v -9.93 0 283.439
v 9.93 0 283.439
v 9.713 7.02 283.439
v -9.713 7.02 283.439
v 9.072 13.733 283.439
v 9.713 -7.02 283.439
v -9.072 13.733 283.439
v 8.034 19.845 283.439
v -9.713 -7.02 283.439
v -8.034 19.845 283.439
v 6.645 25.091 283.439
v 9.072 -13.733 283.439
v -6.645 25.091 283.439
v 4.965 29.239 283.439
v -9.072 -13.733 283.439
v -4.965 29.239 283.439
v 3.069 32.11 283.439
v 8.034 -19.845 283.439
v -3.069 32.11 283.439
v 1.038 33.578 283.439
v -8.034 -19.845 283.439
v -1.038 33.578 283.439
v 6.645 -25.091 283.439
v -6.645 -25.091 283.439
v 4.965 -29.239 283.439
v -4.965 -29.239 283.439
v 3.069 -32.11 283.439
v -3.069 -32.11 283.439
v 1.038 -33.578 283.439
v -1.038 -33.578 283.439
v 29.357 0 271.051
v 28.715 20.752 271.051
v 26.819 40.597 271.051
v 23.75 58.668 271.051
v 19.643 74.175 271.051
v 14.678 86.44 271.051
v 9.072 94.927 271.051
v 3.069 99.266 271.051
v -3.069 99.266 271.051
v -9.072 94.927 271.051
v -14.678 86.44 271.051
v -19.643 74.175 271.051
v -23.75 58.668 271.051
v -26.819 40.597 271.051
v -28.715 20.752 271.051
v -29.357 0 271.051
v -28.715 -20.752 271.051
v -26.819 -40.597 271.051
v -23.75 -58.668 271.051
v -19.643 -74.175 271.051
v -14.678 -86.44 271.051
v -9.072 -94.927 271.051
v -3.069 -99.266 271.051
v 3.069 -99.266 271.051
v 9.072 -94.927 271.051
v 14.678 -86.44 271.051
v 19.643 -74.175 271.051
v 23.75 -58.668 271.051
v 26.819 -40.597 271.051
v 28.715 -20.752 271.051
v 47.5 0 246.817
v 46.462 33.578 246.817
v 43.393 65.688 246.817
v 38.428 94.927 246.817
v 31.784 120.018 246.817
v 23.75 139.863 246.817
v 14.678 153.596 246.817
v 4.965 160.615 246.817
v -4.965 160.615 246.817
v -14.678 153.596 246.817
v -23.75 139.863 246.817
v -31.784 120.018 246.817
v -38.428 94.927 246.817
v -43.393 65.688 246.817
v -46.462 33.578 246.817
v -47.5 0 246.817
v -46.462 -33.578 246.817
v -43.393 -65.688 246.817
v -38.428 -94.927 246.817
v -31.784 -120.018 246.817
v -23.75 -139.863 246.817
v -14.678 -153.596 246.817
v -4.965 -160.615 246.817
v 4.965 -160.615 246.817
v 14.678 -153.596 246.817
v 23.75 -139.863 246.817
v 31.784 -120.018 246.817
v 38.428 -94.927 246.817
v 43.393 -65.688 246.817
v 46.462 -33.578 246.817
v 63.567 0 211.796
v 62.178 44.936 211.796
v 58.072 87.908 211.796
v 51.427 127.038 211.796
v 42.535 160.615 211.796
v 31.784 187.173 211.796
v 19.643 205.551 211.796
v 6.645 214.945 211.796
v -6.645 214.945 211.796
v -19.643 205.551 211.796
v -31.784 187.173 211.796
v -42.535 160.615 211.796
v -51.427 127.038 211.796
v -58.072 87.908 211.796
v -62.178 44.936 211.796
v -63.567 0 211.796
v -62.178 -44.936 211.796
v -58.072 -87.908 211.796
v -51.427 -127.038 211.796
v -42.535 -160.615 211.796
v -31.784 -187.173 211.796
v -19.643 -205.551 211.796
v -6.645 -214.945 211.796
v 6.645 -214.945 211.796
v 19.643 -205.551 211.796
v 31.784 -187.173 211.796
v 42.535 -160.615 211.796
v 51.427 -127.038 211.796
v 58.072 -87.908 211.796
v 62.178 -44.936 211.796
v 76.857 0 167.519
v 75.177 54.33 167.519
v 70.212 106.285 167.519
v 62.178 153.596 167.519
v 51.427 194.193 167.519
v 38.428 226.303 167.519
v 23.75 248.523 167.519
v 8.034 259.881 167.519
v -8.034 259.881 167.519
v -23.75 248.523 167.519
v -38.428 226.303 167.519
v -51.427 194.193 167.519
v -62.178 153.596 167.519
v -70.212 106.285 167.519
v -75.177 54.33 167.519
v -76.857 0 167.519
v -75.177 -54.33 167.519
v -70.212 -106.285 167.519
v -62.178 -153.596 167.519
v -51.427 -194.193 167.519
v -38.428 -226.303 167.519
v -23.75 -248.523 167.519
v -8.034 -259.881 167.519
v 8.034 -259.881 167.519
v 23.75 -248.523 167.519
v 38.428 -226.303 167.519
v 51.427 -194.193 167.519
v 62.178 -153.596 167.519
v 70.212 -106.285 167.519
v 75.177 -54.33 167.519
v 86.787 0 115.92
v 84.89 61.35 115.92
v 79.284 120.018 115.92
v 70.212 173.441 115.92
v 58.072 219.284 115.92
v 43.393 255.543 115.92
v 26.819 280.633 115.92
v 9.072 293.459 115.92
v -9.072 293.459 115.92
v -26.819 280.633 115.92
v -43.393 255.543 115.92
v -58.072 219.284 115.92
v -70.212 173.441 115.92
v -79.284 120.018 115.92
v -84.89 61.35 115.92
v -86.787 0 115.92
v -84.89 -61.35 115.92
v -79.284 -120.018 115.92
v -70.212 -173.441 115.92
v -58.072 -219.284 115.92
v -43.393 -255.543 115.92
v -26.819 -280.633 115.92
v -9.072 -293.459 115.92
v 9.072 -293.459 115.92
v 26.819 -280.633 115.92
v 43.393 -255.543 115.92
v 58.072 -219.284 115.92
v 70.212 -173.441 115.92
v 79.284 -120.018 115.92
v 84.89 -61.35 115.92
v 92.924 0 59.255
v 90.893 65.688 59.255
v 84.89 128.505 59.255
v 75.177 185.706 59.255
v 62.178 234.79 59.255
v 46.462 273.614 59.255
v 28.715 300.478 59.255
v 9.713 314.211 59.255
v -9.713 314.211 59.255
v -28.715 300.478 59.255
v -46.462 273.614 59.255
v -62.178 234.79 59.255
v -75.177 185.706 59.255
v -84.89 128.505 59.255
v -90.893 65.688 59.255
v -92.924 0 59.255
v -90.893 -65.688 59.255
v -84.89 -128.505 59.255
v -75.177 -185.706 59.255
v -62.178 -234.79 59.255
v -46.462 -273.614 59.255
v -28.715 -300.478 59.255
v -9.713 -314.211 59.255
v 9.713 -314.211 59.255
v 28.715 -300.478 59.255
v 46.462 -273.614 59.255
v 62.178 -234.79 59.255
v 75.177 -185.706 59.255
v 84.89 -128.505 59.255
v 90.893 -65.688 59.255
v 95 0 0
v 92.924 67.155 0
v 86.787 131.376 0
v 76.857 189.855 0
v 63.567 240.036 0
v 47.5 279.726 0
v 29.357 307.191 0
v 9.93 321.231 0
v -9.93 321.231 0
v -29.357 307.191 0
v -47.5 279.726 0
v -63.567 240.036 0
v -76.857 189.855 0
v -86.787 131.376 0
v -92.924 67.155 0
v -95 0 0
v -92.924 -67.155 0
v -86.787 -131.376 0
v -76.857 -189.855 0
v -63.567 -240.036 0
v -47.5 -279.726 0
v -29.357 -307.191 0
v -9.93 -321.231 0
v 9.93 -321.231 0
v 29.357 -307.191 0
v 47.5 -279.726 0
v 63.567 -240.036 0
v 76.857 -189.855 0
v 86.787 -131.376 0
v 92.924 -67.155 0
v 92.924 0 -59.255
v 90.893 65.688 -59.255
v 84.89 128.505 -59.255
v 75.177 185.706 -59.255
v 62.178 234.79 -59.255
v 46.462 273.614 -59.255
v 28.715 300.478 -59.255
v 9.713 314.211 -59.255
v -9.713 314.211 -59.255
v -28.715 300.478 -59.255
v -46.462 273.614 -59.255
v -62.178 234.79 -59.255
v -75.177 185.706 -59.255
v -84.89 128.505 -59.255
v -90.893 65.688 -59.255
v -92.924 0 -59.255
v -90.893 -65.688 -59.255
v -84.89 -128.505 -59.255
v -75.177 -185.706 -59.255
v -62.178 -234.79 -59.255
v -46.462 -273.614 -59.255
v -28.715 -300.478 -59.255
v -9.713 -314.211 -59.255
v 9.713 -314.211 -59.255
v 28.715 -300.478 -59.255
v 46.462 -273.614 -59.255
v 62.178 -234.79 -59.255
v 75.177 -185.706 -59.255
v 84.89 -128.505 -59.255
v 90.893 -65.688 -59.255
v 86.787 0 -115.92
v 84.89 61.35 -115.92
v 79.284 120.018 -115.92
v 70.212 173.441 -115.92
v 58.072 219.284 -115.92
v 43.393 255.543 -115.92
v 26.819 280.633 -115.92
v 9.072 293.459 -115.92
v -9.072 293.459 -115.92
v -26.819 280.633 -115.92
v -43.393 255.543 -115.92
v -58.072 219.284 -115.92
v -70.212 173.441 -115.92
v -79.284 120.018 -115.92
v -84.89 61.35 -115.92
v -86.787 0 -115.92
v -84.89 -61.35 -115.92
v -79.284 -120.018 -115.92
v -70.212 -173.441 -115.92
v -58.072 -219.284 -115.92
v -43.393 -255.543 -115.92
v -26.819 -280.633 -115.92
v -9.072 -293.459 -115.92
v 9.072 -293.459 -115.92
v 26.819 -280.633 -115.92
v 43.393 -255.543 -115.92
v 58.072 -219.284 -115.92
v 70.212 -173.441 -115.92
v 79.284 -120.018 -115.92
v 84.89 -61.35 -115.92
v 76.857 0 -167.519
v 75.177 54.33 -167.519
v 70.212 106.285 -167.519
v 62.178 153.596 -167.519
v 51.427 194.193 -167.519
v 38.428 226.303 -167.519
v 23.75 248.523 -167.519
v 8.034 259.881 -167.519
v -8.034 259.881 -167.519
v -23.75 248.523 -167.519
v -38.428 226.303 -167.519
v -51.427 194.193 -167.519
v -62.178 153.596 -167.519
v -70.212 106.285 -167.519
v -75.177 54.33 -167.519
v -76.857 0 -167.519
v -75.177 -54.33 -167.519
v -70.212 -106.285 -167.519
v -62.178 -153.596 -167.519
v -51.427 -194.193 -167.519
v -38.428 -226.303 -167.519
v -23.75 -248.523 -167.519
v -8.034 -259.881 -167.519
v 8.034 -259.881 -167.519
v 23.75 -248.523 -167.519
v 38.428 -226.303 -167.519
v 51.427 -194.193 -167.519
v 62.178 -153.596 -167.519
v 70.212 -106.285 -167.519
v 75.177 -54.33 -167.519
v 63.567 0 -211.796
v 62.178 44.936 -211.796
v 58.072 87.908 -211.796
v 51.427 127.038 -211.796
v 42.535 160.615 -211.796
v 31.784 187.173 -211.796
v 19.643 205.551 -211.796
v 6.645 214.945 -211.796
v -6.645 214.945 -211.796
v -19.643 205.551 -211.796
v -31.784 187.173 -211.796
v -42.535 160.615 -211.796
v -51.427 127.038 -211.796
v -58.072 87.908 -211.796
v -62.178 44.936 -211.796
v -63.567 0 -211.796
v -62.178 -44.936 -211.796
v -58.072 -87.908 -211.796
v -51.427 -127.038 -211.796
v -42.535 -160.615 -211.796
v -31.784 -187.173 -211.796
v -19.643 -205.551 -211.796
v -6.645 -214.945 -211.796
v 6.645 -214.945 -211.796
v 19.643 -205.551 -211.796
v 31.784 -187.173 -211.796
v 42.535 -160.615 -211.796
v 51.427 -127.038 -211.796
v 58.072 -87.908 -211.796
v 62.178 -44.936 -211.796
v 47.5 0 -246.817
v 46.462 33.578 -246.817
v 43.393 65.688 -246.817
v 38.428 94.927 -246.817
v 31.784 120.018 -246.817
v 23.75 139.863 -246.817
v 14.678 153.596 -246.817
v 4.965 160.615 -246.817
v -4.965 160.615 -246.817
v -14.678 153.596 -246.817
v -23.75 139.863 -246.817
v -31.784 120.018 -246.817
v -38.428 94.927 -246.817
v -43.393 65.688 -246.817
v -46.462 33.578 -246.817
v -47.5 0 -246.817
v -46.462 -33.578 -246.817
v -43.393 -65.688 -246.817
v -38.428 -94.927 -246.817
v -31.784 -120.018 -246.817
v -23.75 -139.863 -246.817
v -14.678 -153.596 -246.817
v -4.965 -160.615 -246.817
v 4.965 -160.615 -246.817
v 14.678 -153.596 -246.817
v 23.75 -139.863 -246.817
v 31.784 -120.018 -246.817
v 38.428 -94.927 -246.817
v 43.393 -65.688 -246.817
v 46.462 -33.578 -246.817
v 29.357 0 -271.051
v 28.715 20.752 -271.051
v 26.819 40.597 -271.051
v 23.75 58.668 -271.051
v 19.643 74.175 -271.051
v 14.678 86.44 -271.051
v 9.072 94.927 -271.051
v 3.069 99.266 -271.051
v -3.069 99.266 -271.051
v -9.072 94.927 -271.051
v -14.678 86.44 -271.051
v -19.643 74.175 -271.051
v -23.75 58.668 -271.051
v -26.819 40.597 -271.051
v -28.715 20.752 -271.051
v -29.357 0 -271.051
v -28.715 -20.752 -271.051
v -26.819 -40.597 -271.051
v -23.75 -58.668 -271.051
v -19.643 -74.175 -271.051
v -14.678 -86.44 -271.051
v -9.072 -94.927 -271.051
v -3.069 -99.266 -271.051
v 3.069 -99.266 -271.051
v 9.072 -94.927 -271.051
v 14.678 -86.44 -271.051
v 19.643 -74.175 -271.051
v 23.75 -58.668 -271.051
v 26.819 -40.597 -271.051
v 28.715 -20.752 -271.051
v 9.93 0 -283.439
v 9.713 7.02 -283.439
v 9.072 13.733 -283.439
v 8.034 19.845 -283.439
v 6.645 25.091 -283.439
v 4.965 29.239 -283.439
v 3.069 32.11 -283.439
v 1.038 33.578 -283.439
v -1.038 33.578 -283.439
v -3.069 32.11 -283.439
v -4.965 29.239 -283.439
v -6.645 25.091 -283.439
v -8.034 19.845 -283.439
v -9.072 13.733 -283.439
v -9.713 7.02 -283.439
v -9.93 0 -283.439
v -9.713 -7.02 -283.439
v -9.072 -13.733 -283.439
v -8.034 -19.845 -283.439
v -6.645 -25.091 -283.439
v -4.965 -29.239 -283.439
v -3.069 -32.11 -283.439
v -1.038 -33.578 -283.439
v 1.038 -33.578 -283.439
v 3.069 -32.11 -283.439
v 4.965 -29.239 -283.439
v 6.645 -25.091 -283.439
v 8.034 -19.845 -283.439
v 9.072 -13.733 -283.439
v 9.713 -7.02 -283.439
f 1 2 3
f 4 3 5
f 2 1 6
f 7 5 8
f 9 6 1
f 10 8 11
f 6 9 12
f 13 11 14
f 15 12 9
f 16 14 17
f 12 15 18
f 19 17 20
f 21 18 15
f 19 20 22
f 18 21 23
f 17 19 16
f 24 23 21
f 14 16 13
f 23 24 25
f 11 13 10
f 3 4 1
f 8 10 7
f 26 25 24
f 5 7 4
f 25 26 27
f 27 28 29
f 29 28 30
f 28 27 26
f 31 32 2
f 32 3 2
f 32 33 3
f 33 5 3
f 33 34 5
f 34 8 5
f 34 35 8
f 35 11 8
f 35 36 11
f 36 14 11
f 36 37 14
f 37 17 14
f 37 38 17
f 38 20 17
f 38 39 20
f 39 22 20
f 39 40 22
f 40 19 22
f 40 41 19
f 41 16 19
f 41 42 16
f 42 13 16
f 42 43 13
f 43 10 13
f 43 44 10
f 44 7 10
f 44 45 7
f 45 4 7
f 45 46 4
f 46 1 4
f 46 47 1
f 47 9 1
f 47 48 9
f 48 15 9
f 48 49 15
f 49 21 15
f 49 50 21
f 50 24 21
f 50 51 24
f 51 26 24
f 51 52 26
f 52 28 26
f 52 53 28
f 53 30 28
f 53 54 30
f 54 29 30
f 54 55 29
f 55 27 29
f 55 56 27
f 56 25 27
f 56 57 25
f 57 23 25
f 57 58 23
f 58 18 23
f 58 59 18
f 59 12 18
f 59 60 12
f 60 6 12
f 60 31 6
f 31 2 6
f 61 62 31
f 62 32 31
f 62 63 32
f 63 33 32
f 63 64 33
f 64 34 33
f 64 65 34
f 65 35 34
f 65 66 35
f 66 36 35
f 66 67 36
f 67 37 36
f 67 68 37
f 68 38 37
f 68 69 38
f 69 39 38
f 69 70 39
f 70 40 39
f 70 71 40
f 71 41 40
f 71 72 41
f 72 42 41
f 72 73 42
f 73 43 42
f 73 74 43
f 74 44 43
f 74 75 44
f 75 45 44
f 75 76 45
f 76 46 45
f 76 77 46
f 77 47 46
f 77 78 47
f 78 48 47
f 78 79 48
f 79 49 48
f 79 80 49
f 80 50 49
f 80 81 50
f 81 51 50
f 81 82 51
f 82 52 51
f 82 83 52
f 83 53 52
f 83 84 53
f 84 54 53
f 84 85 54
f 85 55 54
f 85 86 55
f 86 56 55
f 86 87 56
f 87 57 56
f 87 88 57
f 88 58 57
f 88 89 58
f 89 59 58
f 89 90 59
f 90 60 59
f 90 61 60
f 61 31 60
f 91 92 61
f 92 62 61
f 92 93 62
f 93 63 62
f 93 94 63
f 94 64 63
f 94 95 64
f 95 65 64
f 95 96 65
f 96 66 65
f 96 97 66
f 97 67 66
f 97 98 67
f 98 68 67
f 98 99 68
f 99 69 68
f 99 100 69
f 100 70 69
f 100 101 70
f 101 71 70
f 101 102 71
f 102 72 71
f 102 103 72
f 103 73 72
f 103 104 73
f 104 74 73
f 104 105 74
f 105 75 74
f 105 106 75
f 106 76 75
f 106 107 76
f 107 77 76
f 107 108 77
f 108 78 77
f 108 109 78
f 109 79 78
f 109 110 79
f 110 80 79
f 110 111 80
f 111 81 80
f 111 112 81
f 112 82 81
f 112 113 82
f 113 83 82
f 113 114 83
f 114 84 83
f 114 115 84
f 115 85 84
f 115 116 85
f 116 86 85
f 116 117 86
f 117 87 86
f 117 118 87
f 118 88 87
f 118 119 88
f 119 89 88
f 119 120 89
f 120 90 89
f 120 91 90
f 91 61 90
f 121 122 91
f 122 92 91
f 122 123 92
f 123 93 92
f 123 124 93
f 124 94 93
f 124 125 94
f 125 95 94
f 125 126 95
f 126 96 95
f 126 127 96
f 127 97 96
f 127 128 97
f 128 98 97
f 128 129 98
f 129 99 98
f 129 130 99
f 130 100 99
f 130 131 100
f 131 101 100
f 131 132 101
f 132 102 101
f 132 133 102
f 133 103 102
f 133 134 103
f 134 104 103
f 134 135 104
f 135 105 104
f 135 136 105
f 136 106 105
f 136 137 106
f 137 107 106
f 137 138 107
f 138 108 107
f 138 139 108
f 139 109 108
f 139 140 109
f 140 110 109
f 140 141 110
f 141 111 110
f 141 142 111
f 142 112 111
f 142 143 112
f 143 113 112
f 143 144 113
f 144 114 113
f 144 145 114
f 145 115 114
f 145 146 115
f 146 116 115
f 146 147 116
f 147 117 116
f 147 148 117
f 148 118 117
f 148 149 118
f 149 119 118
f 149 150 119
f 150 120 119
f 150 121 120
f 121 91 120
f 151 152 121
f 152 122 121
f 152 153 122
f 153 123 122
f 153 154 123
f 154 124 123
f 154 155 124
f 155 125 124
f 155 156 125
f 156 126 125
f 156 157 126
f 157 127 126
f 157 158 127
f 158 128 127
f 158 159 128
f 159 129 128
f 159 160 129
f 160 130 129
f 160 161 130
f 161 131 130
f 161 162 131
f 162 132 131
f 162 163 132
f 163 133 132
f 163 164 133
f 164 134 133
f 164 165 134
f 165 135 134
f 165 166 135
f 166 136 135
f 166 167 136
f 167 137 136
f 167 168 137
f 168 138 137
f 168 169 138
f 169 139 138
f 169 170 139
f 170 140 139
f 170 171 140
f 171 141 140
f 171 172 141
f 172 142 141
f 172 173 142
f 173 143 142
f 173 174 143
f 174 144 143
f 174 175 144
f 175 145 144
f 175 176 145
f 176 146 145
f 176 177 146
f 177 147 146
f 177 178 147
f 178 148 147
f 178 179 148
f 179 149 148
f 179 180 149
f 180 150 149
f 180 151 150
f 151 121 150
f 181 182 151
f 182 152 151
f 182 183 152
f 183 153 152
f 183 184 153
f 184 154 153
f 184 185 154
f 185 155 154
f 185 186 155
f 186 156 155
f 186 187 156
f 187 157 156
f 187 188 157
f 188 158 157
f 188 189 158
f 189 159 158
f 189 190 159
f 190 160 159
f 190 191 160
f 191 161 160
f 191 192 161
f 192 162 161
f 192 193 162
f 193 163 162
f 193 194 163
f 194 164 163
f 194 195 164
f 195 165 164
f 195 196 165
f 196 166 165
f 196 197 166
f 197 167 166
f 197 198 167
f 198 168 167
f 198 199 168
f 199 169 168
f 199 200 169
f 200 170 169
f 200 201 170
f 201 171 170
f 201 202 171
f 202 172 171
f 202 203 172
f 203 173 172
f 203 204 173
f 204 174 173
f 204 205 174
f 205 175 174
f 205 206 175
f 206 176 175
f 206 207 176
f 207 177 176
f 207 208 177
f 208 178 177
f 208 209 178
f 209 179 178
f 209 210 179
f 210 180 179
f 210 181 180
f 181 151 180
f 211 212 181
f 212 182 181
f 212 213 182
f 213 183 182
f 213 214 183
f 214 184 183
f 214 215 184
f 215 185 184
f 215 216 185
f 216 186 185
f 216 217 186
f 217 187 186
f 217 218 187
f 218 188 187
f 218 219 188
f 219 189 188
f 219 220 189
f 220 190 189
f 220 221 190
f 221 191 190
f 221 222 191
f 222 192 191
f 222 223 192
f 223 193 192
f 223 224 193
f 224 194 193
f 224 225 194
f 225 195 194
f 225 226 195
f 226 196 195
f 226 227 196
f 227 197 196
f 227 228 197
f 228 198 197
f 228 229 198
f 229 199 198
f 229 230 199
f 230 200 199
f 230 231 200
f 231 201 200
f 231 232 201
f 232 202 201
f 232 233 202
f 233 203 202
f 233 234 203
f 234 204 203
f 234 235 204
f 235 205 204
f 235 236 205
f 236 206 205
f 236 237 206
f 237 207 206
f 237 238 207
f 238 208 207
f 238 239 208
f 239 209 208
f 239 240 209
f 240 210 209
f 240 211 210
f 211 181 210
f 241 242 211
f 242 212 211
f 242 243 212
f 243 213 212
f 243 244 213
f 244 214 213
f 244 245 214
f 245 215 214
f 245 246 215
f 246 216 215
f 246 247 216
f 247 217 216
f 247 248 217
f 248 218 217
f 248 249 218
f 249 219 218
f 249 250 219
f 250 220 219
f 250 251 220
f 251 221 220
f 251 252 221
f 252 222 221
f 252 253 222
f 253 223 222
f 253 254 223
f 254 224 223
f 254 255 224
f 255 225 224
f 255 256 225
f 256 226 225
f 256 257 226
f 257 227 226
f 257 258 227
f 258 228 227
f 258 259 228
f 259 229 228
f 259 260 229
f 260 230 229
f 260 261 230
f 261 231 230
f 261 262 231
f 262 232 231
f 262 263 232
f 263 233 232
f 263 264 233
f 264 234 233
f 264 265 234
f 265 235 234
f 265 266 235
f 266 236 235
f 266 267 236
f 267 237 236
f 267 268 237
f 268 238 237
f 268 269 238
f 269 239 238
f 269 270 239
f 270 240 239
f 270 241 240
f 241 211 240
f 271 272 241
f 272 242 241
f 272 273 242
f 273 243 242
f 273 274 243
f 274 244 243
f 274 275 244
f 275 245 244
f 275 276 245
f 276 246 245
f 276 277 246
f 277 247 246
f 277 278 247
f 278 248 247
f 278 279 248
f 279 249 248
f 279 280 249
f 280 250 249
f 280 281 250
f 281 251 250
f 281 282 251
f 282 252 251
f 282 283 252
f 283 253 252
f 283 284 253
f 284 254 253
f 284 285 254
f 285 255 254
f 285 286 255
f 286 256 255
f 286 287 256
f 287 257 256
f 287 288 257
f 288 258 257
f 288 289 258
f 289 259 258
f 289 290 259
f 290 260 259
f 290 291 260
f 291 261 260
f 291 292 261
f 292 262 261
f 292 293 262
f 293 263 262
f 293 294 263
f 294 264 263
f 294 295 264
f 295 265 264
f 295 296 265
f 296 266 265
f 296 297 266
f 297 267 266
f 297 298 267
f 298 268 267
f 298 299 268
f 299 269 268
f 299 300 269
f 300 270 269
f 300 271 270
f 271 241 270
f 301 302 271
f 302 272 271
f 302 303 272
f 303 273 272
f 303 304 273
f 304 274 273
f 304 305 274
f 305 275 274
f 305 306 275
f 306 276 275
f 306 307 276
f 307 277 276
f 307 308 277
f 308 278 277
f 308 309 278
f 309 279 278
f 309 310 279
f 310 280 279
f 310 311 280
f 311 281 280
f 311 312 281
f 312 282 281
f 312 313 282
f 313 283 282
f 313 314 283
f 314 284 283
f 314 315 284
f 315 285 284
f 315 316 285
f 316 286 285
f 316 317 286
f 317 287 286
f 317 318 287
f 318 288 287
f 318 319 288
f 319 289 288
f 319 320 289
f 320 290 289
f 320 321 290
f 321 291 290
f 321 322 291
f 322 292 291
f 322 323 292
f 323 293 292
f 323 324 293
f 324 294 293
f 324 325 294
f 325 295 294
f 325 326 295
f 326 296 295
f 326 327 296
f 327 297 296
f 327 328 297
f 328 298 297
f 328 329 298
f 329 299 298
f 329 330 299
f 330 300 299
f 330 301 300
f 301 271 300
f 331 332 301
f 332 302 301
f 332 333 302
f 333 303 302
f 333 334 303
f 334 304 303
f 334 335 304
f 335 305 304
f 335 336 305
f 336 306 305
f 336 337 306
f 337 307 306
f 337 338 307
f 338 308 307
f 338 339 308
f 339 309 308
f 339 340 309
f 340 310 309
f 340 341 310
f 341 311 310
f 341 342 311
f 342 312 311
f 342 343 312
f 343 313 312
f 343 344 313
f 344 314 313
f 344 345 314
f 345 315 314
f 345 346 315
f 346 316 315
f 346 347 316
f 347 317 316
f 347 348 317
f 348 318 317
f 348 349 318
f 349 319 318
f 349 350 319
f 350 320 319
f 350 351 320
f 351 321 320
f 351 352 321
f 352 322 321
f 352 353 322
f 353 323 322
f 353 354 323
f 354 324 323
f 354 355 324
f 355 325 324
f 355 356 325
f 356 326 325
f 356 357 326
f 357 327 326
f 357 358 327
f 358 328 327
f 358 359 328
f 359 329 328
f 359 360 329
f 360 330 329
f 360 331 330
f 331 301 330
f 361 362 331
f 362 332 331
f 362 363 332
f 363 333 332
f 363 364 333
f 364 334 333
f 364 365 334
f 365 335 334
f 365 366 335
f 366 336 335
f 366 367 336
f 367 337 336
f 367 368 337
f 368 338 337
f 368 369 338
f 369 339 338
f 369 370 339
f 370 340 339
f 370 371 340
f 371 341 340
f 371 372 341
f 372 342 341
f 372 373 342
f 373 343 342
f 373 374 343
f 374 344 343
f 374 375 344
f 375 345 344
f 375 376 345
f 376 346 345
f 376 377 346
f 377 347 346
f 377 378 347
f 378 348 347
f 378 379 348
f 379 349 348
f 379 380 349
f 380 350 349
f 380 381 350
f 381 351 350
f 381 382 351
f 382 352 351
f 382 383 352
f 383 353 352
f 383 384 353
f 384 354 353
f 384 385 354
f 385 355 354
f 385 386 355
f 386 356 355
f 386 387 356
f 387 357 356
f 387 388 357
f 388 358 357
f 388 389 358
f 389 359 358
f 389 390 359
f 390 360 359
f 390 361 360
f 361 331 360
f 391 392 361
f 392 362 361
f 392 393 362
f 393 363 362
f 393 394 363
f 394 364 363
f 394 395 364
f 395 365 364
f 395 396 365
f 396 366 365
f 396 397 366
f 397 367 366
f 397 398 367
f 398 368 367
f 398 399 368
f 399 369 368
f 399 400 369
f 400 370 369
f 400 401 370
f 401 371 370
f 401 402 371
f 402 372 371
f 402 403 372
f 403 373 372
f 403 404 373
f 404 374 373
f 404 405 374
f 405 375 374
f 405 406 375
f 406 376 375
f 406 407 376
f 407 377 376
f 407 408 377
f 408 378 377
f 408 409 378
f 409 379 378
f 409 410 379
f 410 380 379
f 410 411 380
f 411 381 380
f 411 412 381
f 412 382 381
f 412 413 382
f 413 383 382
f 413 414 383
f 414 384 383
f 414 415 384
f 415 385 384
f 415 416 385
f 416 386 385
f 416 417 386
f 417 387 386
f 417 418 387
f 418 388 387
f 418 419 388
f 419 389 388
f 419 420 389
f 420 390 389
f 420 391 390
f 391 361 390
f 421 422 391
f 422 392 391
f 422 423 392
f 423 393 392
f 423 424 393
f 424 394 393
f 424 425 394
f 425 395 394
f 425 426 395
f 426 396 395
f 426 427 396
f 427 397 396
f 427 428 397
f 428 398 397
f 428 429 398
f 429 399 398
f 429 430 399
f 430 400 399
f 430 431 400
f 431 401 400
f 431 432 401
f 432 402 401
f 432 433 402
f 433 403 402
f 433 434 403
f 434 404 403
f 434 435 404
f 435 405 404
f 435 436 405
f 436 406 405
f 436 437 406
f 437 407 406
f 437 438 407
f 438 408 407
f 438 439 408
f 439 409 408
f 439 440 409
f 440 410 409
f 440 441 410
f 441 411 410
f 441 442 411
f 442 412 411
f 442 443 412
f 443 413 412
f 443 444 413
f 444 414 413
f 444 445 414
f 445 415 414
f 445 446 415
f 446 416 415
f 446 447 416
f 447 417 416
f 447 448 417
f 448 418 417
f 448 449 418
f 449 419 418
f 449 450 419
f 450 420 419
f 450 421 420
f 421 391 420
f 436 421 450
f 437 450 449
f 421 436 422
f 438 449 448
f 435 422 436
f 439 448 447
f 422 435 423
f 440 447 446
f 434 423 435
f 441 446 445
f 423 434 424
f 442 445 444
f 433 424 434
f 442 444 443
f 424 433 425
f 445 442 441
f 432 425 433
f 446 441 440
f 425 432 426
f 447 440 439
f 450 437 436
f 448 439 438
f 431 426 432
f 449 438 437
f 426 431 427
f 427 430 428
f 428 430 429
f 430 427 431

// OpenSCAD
// Generated by SolidPython 1.0.1 on 2020-07-29 00:46:47


scale(v = [5, 17, 15]) {
	sphere(r = 19);
}
/***********************************************
*********      SolidPython code:      **********
************************************************
 
# import packages: SolidPython
from solid import *
from solid.utils import *
from itertools import chain, combinations, permutations


class Resize:

    def __init__(self, scad_file):
        self.scad_file = scad_file
        #self.scad_file = import_scad(scad_file)
        # cone/cylinder param:
        self.r1 = 0
        self.r2 = 0
        self.h = 0
        # rectangular prism param:
        self.w = 0
        self.l = 0
        # ellipse param:
        self.r = 0

    # import OpenScad code (file name corresponds to shape)


    # classify shape + parameters
    def assign(self, param1, param2, param3):
        if self.scad_file == 'cone.scad':
            self.r1 = param1
            self.r2 = param2
            self.h = param3
        elif self.scad_file == 'cylinder.scad':
            self.r1 = param1
            self.r2 = param2
            self.h = param3
        elif self.scad_file == 'rectangularPrism.scad':
            self.h = param1
            self.l = param2
            self.w = param3
        else:
            self.r = param1
            self.h = param2

    # resize parameters
    def iterate(self):
        x = range(3, 20, 2)
        i = 1
        if self.scad_file == 'cone.scad':
            tempList = list(permutations(x, 2))
            for temp in tempList:
                param1 = temp[0]
                param2 = temp[1]
                filepath = 'produced_scad_files/' + 'cone' + str(param1) + '_' + str(param2) + '_' + '.scad'
                scad_render_to_file(cylinder(h=param1, r1=param2, r2=0), filepath)

        elif self.scad_file == 'cylinder.scad':
            tempList = list(permutations(x, 3))
            for temp in tempList:
                param1 = temp[0]
                param2 = temp[1]
                filepath = 'produced_scad_files/' + 'cylinder' + str(param1) + '_' + str(param2) + '_' + '.scad'
                scad_render_to_file(cylinder(h=param1, r1=param2, r2=param2), filepath)

        elif self.scad_file == 'rectangularPrism.scad':
            tempList = list(permutations(x, 3))
            for temp in tempList:
                param1 = temp[0]
                param2 = temp[1]
                param3 = temp[2]
                filepath = 'produced_scad_files/' + 'rectangularPrism' + str(param1) + '_' + str(param2) + '_' + str(
                    param3) + '.scad'
                scad_render_to_file(cube(size=(param1, param2, param3)), filepath)

        elif self.scad_file == 'ellipse.scad':
            tempList = list(permutations(x, 4))
            for temp in tempList:
                param1 = temp[0]
                param2 = temp[1]
                param3 = temp[2]
                param4 = temp[3]
                filepath = 'produced_scad_files/' + 'ellipse' + str(param1) + '_' + str(param2) + '_' + str(param3) + '_' + str(param4) + '.scad'
                scad_render_to_file(scale([param1, param2, param3])(sphere(r=param4)), filepath)

    def render_to_scadfile(self):
        scad_render_to_file(scad, 'example.scad') 
 
************************************************/
